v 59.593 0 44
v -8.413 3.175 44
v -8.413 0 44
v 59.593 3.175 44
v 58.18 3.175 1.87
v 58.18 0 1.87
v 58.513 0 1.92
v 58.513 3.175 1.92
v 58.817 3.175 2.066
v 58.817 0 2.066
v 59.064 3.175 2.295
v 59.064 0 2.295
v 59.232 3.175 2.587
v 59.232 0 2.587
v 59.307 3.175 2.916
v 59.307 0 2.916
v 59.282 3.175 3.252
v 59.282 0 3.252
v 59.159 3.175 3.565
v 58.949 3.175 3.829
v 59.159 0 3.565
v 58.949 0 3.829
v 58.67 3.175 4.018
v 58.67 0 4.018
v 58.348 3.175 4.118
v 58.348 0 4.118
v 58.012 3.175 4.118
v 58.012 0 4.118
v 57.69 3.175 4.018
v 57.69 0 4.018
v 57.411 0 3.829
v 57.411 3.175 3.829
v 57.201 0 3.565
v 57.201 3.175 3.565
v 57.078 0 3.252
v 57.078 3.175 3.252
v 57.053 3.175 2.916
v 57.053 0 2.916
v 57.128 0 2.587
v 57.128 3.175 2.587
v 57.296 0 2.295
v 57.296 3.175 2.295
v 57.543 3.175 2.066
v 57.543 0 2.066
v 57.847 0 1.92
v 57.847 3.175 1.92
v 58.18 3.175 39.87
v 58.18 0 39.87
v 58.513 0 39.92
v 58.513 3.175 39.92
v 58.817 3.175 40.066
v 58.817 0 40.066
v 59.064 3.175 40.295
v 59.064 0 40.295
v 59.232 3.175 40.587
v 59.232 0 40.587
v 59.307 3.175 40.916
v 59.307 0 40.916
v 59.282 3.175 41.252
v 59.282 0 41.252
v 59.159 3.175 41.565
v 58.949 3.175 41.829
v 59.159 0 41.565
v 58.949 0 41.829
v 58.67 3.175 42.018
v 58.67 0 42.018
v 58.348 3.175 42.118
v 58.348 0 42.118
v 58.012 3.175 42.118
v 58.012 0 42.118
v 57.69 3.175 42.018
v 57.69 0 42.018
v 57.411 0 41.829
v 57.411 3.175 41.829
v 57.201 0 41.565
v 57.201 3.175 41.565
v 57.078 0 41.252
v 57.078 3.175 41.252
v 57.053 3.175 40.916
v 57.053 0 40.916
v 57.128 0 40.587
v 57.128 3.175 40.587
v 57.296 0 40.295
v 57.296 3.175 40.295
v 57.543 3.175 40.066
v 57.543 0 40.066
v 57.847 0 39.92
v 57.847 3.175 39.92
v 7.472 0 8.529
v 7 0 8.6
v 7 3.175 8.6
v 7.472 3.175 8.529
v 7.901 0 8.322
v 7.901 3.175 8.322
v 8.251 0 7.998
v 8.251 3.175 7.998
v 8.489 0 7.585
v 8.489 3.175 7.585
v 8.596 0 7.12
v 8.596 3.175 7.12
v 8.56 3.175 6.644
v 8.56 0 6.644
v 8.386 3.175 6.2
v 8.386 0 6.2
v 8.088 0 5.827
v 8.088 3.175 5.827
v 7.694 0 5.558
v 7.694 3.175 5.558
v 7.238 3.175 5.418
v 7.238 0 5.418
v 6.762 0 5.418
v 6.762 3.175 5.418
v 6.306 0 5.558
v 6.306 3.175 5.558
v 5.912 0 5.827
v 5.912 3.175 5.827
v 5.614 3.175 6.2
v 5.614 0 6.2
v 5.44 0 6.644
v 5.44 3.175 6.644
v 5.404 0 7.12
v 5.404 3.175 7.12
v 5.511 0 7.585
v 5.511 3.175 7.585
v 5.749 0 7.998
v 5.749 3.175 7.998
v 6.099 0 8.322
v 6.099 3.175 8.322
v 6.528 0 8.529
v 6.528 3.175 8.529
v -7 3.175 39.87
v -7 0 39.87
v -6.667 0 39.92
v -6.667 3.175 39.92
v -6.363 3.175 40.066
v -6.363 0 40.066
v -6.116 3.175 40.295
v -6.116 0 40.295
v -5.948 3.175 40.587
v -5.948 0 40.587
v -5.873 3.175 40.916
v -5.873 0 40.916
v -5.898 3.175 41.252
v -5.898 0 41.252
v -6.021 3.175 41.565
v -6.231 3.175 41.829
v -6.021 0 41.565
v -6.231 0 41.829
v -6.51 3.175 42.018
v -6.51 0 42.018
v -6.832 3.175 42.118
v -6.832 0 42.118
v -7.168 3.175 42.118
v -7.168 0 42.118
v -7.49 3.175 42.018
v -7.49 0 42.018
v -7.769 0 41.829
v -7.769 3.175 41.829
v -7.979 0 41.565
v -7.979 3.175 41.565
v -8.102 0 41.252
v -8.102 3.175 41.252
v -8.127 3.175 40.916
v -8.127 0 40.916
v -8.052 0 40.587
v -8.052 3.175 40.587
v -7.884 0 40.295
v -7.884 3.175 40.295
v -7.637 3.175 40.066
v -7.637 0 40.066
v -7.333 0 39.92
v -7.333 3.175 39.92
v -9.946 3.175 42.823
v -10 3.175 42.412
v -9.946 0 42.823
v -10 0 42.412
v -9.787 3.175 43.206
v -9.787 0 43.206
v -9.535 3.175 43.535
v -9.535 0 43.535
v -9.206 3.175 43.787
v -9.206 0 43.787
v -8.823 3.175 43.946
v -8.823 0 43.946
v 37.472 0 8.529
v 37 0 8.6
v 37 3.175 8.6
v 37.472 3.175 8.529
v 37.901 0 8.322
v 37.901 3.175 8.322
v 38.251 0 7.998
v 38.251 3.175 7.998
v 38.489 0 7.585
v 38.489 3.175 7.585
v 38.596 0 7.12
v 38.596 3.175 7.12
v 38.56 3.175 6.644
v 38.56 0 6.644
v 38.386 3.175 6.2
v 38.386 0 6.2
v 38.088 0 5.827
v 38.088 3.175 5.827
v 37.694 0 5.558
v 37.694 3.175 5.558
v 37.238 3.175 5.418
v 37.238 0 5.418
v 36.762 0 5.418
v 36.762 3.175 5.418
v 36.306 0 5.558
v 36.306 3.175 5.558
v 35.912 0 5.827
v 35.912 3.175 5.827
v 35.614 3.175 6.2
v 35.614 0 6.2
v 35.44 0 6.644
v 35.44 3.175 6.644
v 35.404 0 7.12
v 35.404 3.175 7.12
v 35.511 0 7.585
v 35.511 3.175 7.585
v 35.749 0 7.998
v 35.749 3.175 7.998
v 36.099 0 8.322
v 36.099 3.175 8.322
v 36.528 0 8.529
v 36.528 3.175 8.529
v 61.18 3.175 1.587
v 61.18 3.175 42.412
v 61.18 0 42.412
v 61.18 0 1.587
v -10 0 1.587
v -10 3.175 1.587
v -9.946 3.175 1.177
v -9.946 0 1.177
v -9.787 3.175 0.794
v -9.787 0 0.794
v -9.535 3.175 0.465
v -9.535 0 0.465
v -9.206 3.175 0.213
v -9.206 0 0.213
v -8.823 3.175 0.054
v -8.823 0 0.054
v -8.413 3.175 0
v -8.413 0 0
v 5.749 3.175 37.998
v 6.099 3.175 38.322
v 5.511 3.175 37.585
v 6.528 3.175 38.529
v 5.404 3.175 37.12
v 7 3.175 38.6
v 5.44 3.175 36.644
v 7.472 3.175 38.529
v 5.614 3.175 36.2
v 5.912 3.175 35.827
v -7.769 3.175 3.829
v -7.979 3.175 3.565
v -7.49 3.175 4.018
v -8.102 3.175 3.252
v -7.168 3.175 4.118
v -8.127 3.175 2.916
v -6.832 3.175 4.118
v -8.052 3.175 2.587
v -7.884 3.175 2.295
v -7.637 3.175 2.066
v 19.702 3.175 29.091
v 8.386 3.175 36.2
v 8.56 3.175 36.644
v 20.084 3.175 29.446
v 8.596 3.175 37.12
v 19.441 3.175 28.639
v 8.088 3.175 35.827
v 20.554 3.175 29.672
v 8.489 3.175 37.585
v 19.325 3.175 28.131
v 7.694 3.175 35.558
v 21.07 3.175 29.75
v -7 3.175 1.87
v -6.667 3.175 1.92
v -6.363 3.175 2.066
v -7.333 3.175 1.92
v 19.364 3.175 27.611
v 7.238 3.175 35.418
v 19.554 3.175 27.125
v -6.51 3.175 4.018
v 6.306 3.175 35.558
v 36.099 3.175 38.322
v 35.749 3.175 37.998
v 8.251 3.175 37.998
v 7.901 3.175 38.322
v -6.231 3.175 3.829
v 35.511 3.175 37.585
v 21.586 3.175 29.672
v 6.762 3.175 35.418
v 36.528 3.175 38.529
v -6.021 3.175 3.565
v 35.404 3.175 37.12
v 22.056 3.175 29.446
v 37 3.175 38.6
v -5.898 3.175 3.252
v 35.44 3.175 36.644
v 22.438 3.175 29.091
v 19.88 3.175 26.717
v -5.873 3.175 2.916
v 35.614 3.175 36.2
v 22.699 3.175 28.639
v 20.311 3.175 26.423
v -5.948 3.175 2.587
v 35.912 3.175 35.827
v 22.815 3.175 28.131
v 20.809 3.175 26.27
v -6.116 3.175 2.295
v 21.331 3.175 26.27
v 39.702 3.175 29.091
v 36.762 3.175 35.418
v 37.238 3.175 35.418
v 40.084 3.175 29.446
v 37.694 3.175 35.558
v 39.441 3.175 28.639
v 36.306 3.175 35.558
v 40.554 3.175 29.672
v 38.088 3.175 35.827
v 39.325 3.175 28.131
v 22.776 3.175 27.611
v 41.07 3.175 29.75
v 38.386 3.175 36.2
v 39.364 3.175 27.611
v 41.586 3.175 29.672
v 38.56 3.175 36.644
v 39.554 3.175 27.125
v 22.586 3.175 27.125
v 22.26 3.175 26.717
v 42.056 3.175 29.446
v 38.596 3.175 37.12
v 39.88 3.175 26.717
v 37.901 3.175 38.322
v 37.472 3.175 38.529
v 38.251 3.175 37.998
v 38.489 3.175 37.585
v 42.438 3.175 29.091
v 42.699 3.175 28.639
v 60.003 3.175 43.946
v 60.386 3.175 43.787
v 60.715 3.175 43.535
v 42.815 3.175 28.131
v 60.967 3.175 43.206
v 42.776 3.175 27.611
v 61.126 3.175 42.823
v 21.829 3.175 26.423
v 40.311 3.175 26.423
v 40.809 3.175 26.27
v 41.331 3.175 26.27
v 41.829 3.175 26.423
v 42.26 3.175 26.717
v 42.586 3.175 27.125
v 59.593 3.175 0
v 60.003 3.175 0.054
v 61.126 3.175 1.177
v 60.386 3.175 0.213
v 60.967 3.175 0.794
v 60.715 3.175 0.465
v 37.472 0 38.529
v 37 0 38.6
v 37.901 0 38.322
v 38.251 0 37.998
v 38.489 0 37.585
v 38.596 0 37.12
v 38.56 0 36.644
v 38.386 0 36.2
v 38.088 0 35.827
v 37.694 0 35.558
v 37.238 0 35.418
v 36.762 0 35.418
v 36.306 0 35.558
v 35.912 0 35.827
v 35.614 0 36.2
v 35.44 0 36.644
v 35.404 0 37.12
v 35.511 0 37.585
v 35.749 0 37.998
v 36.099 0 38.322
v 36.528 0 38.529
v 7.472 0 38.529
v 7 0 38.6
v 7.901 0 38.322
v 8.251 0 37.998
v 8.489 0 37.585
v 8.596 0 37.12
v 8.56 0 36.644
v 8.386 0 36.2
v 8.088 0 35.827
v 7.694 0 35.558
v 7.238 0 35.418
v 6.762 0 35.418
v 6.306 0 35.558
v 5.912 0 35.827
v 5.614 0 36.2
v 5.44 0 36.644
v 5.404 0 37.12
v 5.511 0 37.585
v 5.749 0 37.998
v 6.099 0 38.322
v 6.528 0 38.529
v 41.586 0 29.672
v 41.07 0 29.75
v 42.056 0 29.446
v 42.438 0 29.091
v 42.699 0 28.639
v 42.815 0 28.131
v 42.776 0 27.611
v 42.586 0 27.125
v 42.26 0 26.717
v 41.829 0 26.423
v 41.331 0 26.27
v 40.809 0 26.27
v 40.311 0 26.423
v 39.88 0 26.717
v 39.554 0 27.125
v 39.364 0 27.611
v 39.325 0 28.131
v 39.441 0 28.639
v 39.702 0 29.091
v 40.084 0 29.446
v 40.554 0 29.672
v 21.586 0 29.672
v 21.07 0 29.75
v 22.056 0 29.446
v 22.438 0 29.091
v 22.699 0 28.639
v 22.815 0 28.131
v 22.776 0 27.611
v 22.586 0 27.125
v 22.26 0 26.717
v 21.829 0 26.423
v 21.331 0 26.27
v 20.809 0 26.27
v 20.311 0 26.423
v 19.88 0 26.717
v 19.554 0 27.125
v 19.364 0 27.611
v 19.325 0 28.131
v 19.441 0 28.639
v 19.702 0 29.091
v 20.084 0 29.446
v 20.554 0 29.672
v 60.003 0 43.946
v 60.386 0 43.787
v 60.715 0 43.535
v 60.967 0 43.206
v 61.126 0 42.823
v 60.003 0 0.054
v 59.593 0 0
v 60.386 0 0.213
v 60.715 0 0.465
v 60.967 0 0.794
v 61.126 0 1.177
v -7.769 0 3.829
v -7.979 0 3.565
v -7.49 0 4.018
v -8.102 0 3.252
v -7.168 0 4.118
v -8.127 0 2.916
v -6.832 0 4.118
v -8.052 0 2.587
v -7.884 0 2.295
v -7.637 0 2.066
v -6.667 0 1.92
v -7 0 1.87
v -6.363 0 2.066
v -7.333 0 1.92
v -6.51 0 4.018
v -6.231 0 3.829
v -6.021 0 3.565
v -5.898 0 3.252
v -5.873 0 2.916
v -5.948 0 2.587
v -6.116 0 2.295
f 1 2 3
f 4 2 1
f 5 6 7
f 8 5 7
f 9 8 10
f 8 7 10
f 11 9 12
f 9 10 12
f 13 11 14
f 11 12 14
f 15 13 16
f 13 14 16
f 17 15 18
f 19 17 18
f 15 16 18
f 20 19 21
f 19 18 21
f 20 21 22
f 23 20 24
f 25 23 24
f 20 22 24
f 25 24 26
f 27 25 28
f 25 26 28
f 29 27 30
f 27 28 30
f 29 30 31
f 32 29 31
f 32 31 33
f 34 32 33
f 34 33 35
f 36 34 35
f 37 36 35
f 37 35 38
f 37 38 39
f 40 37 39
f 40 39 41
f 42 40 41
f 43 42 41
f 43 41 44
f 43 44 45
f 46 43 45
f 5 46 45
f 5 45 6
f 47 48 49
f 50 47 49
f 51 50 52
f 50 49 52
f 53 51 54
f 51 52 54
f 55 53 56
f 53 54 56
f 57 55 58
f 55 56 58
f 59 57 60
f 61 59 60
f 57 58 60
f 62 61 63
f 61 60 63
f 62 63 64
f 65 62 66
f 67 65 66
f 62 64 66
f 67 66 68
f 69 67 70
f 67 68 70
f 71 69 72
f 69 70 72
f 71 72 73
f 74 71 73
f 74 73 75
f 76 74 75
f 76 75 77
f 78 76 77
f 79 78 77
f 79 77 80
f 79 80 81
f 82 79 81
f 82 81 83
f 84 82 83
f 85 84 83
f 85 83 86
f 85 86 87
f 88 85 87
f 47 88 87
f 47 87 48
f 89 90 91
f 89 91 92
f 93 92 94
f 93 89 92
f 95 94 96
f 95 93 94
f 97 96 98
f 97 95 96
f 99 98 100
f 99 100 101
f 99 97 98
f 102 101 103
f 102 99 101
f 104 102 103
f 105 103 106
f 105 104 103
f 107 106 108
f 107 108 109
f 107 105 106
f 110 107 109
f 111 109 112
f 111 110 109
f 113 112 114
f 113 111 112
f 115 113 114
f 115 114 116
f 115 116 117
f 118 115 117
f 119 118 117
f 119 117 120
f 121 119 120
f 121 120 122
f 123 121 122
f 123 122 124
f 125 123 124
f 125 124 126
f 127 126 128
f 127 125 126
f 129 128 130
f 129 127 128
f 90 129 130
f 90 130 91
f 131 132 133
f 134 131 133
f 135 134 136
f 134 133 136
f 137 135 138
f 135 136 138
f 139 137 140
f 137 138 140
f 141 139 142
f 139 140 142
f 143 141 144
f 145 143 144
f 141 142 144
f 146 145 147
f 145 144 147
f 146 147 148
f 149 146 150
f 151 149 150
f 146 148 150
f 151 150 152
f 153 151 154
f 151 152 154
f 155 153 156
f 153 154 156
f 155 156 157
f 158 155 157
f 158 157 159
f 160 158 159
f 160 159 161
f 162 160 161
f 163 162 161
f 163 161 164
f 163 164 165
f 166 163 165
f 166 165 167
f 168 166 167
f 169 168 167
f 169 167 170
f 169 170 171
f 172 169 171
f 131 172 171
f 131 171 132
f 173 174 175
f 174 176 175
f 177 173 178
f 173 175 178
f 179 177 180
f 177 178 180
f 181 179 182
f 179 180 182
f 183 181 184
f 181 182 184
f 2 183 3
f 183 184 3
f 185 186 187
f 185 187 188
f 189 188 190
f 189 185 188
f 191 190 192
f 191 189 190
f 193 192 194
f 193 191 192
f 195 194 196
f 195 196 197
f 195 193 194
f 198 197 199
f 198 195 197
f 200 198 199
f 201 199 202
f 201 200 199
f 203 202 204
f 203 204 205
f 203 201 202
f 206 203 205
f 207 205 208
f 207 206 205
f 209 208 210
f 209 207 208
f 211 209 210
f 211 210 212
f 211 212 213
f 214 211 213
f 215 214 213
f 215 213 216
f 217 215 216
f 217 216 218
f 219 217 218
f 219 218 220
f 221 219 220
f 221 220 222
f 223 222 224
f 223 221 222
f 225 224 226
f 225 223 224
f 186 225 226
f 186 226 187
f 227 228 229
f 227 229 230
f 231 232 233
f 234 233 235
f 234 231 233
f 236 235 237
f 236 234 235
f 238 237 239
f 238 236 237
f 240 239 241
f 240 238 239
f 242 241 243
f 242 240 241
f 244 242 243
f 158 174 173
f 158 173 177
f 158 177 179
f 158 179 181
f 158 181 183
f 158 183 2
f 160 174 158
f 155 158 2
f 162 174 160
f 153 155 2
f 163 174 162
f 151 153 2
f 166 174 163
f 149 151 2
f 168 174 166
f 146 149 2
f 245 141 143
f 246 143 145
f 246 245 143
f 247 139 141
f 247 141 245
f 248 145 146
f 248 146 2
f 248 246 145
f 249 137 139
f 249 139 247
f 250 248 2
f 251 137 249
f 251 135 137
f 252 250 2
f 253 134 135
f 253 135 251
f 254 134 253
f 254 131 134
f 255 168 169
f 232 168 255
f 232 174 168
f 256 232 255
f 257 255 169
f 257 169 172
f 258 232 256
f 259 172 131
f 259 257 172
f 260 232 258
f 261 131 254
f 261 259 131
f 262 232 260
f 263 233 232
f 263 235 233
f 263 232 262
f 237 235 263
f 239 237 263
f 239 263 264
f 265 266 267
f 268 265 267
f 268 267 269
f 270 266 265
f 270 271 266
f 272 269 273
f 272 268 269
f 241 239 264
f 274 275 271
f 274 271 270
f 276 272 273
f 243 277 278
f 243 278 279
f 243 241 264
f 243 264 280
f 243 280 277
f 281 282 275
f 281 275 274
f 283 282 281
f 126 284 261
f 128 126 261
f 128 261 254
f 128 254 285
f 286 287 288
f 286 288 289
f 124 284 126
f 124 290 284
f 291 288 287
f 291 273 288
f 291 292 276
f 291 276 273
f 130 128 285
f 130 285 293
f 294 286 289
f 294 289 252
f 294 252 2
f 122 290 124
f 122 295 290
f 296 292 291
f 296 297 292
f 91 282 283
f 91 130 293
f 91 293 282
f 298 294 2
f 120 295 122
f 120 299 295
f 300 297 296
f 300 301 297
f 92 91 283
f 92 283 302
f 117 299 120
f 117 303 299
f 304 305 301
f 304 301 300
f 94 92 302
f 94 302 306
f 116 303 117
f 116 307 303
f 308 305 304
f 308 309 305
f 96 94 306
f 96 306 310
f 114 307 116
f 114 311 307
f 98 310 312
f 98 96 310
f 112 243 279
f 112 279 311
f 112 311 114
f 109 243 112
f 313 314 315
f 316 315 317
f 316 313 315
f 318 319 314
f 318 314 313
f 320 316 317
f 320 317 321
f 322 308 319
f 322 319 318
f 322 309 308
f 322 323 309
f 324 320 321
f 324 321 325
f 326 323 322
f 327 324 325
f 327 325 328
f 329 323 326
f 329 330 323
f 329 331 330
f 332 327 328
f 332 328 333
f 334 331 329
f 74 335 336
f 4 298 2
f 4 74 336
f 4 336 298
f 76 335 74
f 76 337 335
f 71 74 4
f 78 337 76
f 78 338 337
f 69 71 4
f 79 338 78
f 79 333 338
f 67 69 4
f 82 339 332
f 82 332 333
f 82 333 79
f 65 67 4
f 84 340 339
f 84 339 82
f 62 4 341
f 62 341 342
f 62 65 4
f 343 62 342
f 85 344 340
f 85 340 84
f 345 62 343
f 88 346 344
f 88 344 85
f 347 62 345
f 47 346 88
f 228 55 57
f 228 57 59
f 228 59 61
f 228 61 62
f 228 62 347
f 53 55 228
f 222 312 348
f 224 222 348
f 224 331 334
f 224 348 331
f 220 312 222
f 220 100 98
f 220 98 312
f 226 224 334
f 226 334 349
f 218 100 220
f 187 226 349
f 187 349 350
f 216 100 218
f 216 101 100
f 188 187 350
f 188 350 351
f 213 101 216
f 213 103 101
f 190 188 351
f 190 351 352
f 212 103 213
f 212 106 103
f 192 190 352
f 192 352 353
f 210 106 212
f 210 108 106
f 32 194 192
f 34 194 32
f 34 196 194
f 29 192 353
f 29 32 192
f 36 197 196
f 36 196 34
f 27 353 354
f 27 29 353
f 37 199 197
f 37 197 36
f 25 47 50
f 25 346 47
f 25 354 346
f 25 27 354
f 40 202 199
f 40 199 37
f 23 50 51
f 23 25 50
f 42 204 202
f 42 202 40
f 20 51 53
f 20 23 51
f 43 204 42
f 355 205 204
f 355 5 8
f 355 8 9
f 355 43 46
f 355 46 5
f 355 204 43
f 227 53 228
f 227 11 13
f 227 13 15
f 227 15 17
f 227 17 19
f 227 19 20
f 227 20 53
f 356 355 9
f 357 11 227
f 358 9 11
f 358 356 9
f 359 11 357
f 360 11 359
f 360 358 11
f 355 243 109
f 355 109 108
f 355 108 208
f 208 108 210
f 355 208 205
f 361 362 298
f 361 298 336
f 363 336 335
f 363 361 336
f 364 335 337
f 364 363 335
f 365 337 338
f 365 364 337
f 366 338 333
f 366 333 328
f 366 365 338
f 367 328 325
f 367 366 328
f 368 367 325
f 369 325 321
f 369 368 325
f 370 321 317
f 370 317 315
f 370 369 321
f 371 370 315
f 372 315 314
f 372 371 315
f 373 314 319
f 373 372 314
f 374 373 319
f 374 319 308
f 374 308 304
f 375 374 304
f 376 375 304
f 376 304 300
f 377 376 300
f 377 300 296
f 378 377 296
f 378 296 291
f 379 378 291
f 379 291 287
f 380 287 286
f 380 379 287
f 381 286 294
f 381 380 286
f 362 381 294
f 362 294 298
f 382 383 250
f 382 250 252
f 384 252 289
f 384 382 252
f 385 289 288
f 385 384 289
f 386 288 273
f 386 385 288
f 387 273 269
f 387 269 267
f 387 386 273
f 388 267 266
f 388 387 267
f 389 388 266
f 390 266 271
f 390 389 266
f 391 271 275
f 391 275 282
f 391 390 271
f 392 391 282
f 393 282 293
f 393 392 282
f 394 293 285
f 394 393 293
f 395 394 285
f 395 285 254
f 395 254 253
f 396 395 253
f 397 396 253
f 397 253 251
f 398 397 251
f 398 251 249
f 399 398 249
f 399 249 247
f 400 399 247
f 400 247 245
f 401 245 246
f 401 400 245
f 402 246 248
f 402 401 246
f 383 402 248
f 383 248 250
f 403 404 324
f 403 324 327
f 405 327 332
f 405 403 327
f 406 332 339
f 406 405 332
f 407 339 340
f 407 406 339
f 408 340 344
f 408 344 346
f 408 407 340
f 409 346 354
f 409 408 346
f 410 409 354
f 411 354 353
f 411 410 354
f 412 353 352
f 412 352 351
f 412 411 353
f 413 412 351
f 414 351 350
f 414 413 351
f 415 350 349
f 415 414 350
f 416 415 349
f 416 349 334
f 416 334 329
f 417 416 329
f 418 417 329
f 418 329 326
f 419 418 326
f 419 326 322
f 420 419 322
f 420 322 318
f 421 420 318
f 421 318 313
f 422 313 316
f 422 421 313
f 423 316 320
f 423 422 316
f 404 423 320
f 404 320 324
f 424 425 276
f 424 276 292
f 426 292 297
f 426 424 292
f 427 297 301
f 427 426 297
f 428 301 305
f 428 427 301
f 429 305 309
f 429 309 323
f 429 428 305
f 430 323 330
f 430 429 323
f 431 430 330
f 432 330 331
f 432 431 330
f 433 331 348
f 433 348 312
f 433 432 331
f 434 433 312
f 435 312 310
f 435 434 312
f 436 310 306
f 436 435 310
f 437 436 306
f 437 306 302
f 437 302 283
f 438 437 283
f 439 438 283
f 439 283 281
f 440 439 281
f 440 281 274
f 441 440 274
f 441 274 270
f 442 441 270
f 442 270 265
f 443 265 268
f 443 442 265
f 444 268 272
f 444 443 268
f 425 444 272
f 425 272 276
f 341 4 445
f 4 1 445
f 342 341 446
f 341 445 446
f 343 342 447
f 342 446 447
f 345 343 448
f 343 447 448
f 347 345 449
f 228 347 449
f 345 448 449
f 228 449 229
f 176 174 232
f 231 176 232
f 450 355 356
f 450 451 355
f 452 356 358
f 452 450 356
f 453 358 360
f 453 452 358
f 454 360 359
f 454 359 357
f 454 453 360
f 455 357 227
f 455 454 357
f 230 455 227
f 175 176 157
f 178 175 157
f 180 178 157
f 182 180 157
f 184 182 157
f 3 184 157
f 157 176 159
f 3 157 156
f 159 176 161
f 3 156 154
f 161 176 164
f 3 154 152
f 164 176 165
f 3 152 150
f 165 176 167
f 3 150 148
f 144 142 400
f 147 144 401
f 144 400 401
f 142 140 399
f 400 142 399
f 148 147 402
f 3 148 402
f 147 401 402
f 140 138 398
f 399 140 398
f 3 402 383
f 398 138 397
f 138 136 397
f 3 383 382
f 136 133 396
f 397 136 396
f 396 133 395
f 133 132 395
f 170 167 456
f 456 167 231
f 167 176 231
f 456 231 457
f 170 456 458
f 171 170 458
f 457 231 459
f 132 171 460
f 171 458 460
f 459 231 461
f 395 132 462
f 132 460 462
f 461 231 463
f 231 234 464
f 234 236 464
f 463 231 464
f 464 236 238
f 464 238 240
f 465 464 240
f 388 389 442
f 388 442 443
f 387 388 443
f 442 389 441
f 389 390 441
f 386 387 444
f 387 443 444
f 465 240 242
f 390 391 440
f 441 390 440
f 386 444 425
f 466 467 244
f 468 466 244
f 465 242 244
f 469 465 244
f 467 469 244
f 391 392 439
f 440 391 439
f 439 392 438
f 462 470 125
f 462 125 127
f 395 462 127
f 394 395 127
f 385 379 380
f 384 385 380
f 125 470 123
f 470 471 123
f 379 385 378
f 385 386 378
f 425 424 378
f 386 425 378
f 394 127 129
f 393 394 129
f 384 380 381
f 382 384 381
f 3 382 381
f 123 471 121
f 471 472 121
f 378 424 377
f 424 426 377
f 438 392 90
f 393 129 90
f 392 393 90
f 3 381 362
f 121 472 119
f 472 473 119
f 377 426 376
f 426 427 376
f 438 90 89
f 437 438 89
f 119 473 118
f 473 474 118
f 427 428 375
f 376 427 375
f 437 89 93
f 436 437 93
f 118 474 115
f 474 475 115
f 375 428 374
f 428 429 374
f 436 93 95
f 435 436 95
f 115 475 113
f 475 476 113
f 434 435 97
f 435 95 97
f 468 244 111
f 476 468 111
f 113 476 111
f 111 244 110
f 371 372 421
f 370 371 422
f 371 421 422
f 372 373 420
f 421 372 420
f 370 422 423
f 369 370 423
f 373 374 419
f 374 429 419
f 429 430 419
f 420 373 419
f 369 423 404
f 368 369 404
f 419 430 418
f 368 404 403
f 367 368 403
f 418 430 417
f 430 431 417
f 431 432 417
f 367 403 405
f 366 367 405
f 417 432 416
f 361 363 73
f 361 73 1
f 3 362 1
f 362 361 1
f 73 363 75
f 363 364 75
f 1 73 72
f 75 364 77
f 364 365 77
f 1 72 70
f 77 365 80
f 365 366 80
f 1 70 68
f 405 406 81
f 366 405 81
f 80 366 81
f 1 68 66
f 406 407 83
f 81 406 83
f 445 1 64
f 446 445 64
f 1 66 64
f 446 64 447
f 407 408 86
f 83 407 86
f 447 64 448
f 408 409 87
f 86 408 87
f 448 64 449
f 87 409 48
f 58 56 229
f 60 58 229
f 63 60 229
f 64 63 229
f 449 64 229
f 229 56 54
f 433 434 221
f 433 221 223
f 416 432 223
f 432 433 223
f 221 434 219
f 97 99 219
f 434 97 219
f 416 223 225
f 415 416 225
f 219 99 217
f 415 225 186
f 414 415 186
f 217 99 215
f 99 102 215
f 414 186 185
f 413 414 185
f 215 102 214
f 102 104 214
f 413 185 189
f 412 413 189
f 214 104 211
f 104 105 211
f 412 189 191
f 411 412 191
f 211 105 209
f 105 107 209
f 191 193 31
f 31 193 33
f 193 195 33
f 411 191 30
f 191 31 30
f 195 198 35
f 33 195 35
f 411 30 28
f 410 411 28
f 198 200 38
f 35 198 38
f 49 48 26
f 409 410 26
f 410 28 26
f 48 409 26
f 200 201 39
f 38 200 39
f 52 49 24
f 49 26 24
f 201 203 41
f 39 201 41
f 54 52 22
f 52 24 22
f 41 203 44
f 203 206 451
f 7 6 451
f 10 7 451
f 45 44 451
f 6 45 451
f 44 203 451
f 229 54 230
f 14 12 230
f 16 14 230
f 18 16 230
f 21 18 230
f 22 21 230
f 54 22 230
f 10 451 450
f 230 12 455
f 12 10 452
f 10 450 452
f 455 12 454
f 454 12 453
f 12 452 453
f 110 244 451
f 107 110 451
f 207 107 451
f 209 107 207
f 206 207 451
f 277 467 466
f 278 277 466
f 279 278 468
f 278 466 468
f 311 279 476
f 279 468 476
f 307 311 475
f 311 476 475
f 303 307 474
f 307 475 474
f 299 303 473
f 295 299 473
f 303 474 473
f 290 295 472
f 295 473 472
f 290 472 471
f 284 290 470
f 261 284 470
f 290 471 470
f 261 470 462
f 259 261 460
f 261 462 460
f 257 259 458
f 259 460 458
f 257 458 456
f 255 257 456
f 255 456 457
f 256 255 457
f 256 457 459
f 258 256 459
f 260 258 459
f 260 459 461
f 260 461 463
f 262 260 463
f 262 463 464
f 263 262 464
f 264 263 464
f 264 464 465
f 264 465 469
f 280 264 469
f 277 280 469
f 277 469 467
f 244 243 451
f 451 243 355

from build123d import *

# Parameters (mm, degrees)
SKETCH1_W             = 44
SKETCH1_H             = 44
SKETCH1_R             = 1.6
SKETCH1_R_2           = 1.75
SKETCH1_W_2           = 7.18
BOSS_EXTRUDE1_DEPTH   = 3.175
SKETCH2_W             = 10
SKETCH2_H             = 44
BOSS_EXTRUDE2_DEPTH   = 3.175
F_4_40_TAPPED_HOLE1_D = 2.2606
FILLET2_R             = 1.5875


with BuildPart() as part:
    # Sketch1 → Boss-Extrude1 (new body)
    # profile 1 of 2: a face of its own
    with BuildSketch(Plane(origin=(0, 0, 0), x_dir=(1, 0, 0), z_dir=(0, 1, 0))):
        with Locations((22, -22)):
            Rectangle(SKETCH1_W, SKETCH1_H)
        with Locations(Location((7, -37, 0), (0, 0, 270))):
            Circle(SKETCH1_R, mode=Mode.SUBTRACT)
        with Locations(Location((21.07, -28, 0), (0, 0, 270))):
            Circle(SKETCH1_R_2, mode=Mode.SUBTRACT)
        with Locations(Location((37, -37, 0), (0, 0, 270))):
            Circle(SKETCH1_R, mode=Mode.SUBTRACT)
        with Locations(Location((41.07, -28, 0), (0, 0, 270))):
            Circle(SKETCH1_R_2, mode=Mode.SUBTRACT)
        with Locations(Location((7, -7, 0), (0, 0, 270))):
            Circle(SKETCH1_R, mode=Mode.SUBTRACT)
        with Locations(Location((37, -7, 0), (0, 0, 270))):
            Circle(SKETCH1_R, mode=Mode.SUBTRACT)
    # profile 2 of 2: a face of its own
    with BuildSketch(Plane(origin=(0, 0, 0), x_dir=(1, 0, 0), z_dir=(0, 1, 0))):
        with Locations((47.59, -22)):
            Rectangle(SKETCH1_W_2, SKETCH1_H)
    extrude(amount=BOSS_EXTRUDE1_DEPTH)

    # Sketch2 → Boss-Extrude2 (add)
    with BuildSketch(Plane(origin=(0, 3.175, 0), x_dir=(1, 0, 0), z_dir=(0, 1, 0))):
        with Locations((-5, -22)):
            Rectangle(SKETCH2_W, SKETCH2_H)
        with Locations((56.18, -22)):
            Rectangle(SKETCH2_W, SKETCH2_H)
    extrude(amount=-BOSS_EXTRUDE2_DEPTH)

    # #4-40 Tapped Hole1 (through all)
    with Locations(Plane(origin=(-7, 3.175, 3), x_dir=(0, 0, 1), z_dir=(0, 1, 0))):
        with Locations((0, 0), (38, 0), (0, 65.18), (38, 65.18)):
            Hole(F_4_40_TAPPED_HOLE1_D / 2)

    # Fillet2
    fillet2_edges = [part.edges().sort_by_distance(p)[0] for p in [
        (-10, 1.5875, 0),
        (-10, 1.5875, 44),
        (61.18, 1.5875, 44),
        (61.18, 1.5875, 0),
    ]]
    fillet(fillet2_edges, radius=FILLET2_R)


solid = part.part
